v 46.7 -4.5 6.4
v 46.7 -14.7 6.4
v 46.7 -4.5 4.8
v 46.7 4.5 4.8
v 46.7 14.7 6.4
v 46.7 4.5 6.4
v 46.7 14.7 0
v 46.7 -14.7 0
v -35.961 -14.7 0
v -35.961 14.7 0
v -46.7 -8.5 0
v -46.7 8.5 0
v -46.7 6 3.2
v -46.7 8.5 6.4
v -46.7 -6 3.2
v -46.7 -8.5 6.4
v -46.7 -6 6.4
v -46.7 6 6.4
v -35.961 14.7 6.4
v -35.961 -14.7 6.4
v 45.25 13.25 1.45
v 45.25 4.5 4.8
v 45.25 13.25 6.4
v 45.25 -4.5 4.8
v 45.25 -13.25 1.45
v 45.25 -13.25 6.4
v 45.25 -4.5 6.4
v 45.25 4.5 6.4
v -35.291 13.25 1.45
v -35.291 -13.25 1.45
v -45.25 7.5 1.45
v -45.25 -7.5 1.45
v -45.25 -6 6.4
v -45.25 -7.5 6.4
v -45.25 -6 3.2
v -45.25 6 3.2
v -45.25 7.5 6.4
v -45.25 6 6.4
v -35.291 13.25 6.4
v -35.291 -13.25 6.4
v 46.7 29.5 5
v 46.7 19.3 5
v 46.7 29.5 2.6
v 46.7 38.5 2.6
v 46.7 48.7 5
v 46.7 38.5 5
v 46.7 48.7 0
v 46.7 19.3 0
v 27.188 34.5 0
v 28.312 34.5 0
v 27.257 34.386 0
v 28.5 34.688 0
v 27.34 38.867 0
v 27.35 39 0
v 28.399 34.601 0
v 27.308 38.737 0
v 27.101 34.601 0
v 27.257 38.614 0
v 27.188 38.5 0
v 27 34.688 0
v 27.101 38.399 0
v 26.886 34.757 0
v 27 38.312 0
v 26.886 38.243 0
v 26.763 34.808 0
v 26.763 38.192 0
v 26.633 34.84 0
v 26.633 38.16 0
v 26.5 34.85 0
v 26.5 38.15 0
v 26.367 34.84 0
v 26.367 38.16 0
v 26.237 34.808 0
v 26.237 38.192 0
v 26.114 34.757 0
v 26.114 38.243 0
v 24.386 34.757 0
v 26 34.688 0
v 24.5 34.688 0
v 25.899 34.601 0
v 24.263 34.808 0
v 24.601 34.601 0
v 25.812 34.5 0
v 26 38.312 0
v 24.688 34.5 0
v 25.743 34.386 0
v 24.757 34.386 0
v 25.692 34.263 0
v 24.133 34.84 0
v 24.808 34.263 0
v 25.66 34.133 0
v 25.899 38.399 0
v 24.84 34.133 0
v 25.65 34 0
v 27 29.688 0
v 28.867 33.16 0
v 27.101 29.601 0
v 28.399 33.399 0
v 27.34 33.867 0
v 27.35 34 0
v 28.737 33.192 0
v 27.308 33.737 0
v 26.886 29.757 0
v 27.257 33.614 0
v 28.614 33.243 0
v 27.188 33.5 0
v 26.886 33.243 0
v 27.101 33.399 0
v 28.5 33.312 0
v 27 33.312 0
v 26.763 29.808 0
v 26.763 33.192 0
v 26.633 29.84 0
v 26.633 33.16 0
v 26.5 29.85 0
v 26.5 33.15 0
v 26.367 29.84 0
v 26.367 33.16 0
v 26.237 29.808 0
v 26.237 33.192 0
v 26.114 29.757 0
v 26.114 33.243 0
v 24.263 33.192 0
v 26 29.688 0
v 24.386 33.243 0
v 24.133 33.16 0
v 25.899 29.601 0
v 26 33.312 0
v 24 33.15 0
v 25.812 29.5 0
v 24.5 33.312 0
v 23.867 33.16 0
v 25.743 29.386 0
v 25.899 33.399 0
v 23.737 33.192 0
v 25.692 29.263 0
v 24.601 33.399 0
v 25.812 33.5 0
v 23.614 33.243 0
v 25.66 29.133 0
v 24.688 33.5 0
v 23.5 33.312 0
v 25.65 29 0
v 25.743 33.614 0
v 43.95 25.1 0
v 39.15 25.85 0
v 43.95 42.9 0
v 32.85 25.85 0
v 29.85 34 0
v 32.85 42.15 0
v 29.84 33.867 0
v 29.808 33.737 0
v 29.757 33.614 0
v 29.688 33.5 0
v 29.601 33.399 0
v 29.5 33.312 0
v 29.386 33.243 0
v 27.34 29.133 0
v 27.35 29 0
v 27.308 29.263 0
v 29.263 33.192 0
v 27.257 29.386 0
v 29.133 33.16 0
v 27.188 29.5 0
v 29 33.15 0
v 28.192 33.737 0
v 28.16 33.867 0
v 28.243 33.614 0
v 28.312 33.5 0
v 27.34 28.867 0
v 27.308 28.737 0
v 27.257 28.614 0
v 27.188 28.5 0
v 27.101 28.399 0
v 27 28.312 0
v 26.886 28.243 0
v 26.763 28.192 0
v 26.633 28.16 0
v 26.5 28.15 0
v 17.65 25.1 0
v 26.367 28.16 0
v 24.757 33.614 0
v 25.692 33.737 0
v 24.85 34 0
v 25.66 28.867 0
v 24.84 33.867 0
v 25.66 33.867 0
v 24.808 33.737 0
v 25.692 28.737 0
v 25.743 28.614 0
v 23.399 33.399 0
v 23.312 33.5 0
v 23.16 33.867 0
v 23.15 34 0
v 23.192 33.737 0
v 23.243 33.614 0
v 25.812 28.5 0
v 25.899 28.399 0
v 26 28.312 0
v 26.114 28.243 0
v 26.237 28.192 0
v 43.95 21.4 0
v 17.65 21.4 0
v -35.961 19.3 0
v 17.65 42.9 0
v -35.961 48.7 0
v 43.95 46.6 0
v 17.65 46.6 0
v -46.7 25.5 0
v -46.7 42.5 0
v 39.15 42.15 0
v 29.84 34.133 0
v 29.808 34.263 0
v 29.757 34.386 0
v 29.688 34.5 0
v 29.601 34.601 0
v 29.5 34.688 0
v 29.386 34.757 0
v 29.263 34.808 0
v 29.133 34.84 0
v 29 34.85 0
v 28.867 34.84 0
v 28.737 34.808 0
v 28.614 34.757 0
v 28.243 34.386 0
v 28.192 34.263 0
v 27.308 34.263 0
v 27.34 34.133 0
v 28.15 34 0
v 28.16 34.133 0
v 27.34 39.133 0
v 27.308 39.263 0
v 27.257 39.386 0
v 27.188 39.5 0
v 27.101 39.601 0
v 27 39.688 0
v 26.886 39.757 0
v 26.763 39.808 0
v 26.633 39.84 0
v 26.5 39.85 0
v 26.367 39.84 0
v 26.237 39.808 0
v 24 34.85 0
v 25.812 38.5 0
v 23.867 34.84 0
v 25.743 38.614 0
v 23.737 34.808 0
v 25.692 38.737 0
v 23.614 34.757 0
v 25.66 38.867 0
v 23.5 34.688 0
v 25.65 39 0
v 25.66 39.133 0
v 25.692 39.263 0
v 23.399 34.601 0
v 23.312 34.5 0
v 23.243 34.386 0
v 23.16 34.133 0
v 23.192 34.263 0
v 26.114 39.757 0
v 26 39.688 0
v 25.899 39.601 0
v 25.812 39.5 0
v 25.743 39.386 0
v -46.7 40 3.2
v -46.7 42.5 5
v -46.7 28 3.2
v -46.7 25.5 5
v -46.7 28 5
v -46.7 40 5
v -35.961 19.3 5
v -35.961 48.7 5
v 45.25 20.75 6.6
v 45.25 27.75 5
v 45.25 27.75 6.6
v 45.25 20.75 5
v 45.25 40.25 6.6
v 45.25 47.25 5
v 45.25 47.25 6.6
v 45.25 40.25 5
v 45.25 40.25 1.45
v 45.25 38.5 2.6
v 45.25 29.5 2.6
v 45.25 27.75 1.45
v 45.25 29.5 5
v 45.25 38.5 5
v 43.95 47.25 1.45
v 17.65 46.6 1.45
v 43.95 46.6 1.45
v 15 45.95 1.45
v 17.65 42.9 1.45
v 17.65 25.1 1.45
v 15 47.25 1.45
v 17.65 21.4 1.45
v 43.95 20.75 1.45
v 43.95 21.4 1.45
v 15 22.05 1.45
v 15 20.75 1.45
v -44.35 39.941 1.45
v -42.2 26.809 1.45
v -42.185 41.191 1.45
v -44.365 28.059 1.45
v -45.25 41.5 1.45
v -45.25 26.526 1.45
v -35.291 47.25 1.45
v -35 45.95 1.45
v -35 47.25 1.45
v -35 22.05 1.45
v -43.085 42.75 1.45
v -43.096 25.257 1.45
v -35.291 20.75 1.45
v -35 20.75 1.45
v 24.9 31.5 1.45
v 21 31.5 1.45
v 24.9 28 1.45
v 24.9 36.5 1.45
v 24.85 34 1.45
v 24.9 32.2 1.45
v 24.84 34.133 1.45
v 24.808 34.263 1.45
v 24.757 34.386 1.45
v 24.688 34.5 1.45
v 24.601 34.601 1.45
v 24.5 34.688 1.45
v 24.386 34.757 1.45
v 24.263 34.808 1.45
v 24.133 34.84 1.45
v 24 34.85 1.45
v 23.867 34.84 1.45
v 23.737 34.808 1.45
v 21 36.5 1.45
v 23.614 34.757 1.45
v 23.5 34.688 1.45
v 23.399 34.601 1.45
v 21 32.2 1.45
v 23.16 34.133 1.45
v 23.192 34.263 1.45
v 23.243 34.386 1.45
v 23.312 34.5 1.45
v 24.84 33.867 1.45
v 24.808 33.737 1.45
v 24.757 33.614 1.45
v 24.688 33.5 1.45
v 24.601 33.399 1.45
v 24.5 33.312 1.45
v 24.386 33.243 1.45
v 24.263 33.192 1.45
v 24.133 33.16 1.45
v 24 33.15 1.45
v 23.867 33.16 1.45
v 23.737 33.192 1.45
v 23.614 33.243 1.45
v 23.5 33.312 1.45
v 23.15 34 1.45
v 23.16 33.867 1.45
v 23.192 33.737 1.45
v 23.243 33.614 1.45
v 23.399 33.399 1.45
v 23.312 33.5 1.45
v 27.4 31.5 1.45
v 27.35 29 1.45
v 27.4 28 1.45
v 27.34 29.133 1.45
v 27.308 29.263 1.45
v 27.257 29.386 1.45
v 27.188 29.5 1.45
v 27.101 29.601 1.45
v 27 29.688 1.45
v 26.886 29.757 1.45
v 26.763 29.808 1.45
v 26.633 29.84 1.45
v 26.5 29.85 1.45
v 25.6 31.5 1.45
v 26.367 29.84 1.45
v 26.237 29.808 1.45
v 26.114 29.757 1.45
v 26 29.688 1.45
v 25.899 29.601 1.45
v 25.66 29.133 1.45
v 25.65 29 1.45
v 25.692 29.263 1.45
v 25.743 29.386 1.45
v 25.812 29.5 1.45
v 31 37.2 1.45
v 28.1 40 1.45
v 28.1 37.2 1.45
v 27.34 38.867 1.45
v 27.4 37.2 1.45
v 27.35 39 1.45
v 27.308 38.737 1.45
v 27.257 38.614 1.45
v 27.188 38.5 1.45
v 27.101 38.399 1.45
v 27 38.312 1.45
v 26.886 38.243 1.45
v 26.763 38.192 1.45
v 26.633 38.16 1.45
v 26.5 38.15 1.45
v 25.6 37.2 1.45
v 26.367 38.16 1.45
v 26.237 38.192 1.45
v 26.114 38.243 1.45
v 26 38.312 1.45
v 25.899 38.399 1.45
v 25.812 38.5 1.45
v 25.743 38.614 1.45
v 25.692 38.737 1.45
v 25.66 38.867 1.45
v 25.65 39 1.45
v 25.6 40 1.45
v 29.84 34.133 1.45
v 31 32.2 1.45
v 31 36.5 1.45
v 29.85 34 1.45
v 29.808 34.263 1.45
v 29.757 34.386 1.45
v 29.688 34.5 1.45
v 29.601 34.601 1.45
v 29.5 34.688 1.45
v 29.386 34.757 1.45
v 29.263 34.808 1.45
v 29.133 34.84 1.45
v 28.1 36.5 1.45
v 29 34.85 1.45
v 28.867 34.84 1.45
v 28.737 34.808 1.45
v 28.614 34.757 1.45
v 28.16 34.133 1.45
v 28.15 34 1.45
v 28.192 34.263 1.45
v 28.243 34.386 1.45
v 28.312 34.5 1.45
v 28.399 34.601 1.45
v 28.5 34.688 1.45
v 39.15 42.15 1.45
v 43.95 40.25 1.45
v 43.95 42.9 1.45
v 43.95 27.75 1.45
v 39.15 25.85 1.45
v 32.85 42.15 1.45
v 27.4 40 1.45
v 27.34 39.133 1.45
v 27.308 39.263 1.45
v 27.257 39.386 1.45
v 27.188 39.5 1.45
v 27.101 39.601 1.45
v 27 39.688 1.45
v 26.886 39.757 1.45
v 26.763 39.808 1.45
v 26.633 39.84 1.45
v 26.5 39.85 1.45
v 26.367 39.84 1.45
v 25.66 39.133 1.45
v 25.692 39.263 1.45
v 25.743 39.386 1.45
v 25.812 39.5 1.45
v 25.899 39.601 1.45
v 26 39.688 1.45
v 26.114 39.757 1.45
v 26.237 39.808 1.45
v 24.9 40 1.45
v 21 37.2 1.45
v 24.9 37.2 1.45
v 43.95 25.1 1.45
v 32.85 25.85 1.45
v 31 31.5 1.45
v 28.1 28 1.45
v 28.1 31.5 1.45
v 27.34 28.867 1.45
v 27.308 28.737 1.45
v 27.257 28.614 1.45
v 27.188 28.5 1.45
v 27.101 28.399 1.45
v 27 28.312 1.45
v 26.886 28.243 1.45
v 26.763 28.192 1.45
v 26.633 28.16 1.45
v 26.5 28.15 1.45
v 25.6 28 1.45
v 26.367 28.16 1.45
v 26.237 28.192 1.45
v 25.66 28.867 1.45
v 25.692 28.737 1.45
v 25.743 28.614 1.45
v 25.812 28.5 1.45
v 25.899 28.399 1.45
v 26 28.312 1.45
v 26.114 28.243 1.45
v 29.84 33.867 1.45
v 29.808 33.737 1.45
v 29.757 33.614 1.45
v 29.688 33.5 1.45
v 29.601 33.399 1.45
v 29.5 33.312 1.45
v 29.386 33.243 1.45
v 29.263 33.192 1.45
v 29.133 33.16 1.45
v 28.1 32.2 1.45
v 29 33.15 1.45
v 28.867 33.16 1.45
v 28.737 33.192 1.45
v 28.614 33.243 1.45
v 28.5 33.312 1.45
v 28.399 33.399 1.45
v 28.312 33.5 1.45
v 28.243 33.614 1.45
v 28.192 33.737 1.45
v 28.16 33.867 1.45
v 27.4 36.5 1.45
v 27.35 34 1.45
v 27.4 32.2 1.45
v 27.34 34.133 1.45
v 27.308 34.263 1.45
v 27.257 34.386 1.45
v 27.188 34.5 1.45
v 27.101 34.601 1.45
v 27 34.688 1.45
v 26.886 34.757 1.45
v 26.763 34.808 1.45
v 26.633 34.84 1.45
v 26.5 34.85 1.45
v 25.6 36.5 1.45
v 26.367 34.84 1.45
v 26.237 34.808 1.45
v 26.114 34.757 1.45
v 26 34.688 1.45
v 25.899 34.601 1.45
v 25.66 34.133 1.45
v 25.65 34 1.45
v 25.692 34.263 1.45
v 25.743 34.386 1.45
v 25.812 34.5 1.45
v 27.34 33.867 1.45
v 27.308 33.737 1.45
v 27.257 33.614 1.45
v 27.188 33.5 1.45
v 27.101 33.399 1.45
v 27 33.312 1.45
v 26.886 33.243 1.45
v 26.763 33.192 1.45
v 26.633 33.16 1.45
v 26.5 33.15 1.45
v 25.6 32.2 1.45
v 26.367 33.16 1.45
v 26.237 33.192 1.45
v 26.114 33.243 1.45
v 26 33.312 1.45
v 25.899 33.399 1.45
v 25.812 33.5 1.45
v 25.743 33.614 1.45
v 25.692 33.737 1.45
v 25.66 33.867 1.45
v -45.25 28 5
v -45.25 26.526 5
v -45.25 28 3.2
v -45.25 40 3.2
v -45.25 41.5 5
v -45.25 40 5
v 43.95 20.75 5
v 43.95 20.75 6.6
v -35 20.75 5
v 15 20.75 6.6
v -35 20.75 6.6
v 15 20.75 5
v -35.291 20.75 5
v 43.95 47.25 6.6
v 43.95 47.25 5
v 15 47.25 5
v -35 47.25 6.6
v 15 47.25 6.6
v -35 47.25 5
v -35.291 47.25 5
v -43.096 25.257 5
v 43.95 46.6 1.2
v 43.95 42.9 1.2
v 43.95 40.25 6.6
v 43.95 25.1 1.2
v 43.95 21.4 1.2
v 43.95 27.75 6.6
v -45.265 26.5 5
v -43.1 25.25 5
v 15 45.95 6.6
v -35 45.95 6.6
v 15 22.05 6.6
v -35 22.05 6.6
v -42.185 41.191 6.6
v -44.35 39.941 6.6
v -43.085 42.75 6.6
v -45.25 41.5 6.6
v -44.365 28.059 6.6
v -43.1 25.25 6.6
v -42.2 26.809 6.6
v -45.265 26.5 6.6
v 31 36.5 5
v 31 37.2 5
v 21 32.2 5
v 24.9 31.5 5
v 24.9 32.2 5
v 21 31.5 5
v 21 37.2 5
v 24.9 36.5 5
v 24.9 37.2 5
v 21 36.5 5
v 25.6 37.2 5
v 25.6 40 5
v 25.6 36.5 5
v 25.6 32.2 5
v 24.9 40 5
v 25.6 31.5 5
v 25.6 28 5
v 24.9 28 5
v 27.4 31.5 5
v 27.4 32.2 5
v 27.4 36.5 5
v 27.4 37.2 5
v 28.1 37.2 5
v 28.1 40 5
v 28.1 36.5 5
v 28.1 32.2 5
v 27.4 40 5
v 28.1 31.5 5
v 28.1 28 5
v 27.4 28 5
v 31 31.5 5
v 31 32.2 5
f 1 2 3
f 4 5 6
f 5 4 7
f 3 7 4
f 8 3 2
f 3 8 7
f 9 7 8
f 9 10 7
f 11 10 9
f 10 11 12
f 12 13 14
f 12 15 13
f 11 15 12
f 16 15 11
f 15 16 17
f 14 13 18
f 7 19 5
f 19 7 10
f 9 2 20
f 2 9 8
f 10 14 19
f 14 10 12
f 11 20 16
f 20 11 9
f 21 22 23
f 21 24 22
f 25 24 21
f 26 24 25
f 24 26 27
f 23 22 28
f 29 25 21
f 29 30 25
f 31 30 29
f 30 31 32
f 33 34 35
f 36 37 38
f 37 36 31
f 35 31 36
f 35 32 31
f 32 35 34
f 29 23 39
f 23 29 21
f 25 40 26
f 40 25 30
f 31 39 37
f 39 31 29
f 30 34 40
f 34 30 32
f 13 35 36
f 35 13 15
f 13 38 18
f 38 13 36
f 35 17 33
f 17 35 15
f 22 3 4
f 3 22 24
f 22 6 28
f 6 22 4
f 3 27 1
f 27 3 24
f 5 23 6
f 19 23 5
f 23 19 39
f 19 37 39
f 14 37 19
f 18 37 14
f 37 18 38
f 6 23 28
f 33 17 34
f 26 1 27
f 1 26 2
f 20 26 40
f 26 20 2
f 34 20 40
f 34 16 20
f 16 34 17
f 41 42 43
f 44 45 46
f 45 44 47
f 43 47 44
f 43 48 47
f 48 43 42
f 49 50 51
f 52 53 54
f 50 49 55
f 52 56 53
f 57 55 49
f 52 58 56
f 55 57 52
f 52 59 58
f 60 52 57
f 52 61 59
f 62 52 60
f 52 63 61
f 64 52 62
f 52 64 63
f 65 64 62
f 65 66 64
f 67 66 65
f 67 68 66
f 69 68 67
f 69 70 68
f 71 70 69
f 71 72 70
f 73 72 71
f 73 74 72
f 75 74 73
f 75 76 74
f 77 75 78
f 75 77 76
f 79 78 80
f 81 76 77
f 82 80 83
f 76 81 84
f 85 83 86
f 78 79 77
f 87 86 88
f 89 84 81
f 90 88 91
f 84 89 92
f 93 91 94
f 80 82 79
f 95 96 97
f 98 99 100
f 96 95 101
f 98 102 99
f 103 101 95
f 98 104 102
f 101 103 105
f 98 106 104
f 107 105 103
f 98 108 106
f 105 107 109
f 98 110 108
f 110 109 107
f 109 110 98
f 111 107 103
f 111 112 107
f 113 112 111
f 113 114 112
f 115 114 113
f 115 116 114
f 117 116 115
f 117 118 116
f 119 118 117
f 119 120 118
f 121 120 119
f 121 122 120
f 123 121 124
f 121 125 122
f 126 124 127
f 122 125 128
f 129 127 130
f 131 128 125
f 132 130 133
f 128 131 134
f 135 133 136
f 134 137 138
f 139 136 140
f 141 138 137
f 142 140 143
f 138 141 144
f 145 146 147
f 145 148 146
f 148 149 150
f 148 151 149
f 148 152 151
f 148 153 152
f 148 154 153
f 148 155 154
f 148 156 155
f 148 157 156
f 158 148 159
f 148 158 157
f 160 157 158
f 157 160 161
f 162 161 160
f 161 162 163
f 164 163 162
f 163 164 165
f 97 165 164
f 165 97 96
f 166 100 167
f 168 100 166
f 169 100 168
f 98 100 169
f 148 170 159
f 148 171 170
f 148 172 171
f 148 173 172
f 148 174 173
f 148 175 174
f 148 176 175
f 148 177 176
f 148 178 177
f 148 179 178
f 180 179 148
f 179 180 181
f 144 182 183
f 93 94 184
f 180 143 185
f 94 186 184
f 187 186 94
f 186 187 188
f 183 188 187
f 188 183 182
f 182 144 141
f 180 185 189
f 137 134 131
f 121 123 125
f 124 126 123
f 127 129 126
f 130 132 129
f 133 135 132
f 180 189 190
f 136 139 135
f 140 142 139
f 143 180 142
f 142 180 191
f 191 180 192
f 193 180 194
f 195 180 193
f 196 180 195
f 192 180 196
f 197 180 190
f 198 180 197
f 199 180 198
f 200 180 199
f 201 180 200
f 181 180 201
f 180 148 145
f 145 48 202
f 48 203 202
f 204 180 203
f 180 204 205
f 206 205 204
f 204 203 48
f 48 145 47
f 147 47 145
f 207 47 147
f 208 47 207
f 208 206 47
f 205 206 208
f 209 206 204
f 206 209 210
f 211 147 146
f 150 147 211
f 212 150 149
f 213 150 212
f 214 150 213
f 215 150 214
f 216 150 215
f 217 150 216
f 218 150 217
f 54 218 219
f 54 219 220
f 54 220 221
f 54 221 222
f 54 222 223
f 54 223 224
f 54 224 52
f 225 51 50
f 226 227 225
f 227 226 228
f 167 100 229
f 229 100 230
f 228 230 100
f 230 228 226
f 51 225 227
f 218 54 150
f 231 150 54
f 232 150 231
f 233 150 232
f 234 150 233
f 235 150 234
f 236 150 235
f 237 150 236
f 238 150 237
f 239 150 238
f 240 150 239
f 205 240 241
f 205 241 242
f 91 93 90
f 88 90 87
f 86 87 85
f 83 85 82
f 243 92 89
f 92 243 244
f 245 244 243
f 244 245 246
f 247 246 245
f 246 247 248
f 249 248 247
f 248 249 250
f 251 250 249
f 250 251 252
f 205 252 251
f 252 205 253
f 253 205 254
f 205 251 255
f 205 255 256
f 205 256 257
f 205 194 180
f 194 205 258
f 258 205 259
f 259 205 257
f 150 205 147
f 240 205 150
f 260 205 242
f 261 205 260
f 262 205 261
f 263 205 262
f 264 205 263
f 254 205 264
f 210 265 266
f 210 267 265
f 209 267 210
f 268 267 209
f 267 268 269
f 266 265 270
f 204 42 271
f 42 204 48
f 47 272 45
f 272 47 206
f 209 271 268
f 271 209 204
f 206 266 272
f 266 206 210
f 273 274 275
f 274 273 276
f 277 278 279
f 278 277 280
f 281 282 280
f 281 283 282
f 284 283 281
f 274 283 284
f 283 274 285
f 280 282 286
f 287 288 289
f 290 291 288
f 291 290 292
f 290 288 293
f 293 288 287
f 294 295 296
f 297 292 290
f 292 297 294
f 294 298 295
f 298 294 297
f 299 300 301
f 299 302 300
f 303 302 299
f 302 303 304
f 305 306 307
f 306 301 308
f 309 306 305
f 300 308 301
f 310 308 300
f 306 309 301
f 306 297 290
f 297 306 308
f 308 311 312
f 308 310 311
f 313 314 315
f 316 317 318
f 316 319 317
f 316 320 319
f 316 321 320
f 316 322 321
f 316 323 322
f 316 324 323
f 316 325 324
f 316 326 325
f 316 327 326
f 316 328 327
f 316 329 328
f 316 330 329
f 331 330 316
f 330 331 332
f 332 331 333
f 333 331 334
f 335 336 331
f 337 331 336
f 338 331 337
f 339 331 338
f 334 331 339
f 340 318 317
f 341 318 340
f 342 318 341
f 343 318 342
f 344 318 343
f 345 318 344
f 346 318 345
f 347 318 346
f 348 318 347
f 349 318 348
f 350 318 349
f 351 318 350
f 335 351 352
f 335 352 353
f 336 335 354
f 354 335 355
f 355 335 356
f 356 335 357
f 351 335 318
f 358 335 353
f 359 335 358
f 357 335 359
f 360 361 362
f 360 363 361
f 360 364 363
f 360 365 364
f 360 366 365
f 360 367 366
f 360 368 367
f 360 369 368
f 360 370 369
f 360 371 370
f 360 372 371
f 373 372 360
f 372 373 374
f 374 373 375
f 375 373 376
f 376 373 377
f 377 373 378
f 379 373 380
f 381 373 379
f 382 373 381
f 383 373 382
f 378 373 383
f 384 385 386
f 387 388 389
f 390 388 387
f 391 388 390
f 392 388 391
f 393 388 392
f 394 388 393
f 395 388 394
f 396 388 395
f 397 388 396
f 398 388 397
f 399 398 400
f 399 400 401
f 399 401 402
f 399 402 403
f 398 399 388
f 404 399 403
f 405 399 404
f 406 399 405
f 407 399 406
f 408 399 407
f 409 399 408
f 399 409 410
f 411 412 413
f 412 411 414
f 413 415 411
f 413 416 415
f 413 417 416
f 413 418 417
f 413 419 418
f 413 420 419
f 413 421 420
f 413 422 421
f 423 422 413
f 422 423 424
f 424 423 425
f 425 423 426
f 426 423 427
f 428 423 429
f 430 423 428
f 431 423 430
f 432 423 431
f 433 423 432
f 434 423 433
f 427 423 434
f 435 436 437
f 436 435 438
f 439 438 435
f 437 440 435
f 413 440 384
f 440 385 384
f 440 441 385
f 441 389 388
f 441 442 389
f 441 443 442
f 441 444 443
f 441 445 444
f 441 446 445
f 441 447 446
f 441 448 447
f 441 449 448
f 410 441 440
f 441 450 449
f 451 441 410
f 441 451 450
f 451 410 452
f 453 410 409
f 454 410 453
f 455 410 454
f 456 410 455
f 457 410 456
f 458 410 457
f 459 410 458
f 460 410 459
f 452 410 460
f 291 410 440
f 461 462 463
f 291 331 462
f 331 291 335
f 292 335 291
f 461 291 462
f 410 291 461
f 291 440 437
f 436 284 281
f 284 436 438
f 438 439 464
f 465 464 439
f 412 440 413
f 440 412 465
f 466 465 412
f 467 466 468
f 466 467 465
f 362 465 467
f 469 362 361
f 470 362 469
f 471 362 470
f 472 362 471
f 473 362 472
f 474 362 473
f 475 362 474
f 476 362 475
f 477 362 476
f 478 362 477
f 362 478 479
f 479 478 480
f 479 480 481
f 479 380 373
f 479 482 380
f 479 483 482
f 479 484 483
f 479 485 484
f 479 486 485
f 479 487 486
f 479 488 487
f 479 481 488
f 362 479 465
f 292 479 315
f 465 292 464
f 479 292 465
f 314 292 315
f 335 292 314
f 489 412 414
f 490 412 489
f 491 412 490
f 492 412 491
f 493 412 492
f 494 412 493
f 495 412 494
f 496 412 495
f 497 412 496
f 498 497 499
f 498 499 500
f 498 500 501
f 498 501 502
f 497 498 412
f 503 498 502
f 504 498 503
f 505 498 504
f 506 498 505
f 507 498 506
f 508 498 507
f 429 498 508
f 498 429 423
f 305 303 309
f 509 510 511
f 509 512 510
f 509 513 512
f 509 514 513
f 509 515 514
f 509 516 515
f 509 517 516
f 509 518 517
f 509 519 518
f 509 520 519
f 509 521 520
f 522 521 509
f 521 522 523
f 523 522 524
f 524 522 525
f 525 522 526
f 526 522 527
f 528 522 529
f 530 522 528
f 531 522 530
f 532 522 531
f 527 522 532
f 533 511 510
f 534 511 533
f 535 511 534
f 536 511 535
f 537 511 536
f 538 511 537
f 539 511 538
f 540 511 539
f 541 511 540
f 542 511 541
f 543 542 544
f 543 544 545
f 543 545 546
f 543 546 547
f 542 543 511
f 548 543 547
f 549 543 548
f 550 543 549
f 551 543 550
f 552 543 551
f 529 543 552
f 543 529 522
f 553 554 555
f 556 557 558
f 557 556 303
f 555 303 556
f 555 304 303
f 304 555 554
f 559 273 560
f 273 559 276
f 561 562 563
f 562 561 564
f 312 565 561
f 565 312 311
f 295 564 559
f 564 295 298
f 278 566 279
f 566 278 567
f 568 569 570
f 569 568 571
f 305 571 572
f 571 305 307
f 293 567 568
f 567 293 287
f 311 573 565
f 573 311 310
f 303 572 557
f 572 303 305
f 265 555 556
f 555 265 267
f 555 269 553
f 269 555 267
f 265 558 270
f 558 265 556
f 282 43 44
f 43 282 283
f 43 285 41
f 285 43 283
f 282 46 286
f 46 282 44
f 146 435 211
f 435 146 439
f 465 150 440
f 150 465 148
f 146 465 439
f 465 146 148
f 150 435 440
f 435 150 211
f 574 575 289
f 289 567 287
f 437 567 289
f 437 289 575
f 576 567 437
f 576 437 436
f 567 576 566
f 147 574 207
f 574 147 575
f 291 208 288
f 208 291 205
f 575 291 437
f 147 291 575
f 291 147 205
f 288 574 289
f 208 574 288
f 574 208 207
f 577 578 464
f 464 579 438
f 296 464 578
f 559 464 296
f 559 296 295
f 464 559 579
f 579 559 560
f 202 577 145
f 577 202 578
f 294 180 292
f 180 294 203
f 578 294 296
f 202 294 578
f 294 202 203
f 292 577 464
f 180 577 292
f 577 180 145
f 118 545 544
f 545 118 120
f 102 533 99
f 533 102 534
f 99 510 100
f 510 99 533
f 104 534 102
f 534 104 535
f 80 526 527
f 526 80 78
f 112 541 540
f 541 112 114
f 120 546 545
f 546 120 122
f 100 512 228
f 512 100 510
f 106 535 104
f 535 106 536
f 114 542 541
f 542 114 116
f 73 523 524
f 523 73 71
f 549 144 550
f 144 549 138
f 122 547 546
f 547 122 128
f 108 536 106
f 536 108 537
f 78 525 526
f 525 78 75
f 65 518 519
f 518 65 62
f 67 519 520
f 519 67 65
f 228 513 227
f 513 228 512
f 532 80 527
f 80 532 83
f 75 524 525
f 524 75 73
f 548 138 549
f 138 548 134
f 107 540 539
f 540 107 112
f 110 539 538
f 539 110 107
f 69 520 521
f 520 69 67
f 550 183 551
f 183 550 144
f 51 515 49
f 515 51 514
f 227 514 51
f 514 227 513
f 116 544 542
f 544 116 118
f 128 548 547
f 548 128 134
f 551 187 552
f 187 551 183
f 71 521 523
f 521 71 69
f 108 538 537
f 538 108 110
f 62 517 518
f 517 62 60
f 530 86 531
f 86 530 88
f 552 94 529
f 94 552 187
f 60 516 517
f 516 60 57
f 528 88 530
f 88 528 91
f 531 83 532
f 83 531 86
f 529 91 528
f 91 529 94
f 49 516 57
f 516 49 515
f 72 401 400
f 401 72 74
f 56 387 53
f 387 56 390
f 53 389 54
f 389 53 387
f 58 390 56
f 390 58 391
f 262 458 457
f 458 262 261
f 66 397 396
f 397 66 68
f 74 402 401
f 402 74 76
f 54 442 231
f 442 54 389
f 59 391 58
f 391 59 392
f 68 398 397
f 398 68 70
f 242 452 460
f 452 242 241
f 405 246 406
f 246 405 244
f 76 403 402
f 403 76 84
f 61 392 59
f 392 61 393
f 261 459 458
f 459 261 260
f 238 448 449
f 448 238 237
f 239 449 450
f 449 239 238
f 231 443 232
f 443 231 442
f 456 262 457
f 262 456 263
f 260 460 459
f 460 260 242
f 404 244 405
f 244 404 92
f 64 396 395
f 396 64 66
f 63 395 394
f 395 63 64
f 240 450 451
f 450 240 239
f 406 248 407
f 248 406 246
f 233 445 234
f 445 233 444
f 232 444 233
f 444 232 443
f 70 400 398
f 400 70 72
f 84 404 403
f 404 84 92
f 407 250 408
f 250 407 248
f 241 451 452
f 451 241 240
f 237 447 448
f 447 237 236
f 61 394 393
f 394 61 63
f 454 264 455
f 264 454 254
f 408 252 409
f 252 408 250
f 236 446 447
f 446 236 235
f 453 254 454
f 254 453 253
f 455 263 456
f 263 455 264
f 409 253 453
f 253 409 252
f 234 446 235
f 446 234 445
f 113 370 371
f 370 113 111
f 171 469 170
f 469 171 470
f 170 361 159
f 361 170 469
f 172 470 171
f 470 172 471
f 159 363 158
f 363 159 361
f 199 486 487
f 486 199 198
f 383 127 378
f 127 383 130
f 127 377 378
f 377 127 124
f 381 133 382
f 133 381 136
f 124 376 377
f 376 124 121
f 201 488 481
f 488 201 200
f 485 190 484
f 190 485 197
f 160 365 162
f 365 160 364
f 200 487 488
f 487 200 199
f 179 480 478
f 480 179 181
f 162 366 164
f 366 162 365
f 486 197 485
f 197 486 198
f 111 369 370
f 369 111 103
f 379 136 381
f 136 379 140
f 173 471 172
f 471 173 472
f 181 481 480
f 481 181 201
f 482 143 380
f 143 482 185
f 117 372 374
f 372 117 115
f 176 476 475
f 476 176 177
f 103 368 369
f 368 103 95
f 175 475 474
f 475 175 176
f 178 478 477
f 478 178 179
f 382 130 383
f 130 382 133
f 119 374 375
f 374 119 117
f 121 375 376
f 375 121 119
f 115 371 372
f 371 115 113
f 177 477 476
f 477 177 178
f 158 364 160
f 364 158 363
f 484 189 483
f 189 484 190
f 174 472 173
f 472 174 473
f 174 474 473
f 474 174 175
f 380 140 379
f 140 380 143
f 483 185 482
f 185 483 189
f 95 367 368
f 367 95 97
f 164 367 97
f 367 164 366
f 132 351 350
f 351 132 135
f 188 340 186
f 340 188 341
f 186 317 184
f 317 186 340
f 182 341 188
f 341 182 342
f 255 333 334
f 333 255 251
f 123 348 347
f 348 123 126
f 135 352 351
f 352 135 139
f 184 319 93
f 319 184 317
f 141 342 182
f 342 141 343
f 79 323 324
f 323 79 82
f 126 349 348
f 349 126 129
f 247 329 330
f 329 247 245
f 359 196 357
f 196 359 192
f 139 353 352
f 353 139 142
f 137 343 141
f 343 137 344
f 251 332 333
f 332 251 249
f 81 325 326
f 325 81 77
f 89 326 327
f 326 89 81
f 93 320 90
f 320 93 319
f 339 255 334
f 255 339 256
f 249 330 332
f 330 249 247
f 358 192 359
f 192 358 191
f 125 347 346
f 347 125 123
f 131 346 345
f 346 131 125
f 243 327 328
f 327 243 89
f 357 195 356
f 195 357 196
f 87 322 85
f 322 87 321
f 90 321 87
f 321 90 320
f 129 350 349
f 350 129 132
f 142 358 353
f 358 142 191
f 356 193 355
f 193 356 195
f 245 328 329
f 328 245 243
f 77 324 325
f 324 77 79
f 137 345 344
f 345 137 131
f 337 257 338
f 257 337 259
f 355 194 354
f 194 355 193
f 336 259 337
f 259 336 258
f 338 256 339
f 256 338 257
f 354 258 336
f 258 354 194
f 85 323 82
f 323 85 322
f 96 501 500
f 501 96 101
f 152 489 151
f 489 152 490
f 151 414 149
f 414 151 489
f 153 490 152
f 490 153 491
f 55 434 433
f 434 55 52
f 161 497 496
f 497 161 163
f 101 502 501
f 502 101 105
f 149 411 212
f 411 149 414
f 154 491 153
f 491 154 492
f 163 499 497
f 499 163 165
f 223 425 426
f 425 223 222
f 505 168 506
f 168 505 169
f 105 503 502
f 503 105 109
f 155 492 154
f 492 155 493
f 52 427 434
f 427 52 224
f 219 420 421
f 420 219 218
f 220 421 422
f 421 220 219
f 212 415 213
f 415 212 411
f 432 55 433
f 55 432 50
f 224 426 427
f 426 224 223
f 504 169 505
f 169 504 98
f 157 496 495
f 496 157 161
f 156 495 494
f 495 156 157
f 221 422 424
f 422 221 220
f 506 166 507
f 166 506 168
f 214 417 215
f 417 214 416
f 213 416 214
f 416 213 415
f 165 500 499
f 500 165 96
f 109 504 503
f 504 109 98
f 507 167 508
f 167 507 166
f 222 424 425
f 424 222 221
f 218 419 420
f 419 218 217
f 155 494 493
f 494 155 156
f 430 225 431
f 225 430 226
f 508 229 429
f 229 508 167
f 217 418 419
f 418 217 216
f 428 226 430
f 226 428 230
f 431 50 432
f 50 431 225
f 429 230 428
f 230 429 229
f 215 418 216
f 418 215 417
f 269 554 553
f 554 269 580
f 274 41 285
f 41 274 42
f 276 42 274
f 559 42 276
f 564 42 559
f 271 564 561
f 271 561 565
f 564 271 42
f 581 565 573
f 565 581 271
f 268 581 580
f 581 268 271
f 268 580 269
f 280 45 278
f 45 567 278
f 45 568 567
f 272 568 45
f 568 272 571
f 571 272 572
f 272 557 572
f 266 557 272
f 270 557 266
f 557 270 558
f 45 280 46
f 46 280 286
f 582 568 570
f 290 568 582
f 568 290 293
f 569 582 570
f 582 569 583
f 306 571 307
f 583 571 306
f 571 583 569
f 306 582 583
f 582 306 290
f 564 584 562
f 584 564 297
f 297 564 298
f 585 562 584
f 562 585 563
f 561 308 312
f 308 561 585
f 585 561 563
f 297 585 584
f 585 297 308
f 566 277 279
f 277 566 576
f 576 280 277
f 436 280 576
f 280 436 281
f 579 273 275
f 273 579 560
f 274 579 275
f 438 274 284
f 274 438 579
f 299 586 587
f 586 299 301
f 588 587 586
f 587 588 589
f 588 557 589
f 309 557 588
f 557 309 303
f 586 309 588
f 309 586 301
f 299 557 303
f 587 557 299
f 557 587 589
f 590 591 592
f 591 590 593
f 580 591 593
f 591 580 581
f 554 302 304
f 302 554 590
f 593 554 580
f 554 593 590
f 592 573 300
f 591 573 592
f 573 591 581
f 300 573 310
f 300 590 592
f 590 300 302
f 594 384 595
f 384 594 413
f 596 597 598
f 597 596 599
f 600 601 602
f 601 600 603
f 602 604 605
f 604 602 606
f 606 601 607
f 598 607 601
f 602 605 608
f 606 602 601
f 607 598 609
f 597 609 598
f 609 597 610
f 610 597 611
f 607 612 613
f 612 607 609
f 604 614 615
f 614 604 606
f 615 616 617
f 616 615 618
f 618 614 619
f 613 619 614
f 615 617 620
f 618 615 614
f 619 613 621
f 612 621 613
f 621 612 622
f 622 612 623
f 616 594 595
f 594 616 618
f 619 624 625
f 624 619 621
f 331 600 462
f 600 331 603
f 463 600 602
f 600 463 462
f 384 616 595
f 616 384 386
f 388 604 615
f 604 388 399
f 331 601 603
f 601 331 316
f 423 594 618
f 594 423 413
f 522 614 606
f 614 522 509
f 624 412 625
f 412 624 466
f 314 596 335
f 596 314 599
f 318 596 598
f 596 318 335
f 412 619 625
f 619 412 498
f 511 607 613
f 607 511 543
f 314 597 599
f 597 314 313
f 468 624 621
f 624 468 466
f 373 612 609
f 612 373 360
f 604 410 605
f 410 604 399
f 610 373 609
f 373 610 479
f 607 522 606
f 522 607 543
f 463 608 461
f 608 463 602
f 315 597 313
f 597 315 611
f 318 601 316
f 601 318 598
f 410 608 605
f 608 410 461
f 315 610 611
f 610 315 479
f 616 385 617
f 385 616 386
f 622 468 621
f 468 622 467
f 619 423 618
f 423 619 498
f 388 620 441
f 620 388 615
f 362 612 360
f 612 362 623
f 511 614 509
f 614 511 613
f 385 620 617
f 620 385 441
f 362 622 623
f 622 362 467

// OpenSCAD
$Wall = 1.2;
$Clearance = 0.5;
$Length = 90;
$Width = 26;
$Height = 8;
$PrintSplit = 5;
$AlignWidth = 1.3;
$AlignHeight = 1.6;

module MainShell()
{
  //Main base of shell
  difference()
  {
    cube([$Length + $Wall + $Clearance + $Wall + $Clearance, $Width + $Wall + $Clearance + $Wall + $Clearance, $Height + $Wall + $Clearance + $Wall + $Clearance], center = true);
    translate([-($Length + $Wall + $Clearance + $Wall + $Clearance) / 2, ($Width / 2) - 4.5, 0])
      rotate(30, [0, 0, 1])
        translate([0, 0, -($Height + $Wall + $Clearance + $Wall + $Clearance + 1) / 2])
          cube([20, 10, $Height + $Wall + $Clearance + $Wall + $Clearance + 1]);
    translate([-($Length + $Wall + $Clearance + $Wall + $Clearance) / 2,  -($Width / 2) + 4.5, 0])
      rotate(-30, [0, 0, 1])
        translate([0, -10, -($Height + $Wall + $Clearance + $Wall + $Clearance + 1) / 2])
          cube([20, 10, $Height + $Wall + $Clearance + $Wall + $Clearance + 1]);
  }
}

module InnerOpening()
{
  //Main base of shell
  difference()
  {
    cube([$Length + $Clearance, $Width + $Clearance, $Height + $Clearance], center = true);
    translate([-($Length + $Clearance) / 2,($Width / 2) - 5.5, 0])
      rotate(30, [0, 0, 1])
        translate([0, 0, -5])
          cube([20, 10, 10]);
    translate([-($Length + $Clearance) / 2,  -($Width / 2) + 5.5, 0])
      rotate(-30, [0, 0, 1])
        translate([0, -10, -5])
          cube([20, 10, 10]);
  }
}

module Dongle()
{
  difference()
  {
    MainShell();
    //
    InnerOpening();
    //USB opening
    translate([-$Length / 2, 0, 0])
      cube([4, 12, 5], center = true);
    //IRDA opening
    translate([$Length / 2, 0, 1.1])
      cube([4, 9, 4], center = true);
    // Port [7:0] opening
    translate([($Length / 2) - 9, 0, $Wall + $Clearance + 2])
      cube([6.3, 16.3, $Height], center = true);
    // Port [15:8] opening
    translate([($Length / 2) - 14.2, -10.75, $Wall + $Clearance + 2])
      cube([26.3, 3.7, 5], center = true);
    //Test opening
    translate([($Length / 2) - 14.2, 10.75, $Wall + $Clearance + 2])
      cube([26.3, 3.7, 5], center = true);
    //LED openings
    //Center
    translate([($Length / 2) - 18.5, 0, 2])
      cylinder(d = 1.7, h = 5, $fn = 40);
    //Bottom
    translate([($Length / 2) - 18.5, -5, 2])
      cylinder(d = 1.7, h = 5, $fn = 40);
    //Top
    translate([($Length / 2) - 18.5, 5, 2])
      cylinder(d = 1.7, h = 5, $fn = 40);
    //Left
    translate([($Length / 2) - 18.5 - 2.5, 0, 2])
      cylinder(d = 1.7, h = 5, $fn = 40);
    //Right
    translate([($Length / 2) - 18.5 + 2.5, 0, 2])
      cylinder(d = 1.7, h = 5, $fn = 40);
  }
}

module PrintBottom()
{
    difference()
    {
      translate([0, 0, ($Height + $Wall + $Clearance + $Wall + $Clearance) / 2])
        Dongle();
      //Slice top off 
      translate([-($Length + $Wall + $Wall + $Clearance + $Clearance + 2)  / 2, -($Width + $Wall + $Wall + $Clearance + $Clearance + 2) / 2, $Height + $Wall + $Wall + $Clearance + $Clearance - $PrintSplit])
        cube([$Length + $Wall + $Wall + $Clearance + $Clearance + 2, $Width + $Wall + $Wall + $Clearance + $Clearance + 2, 20]);
    }
}  

module PrintTop()
{
  difference()
  {
    translate([0, 0, ($Height + $Wall + $Clearance + $Wall + $Clearance) / 2])
      rotate(180, [1, 0, 0])
        Dongle();
    translate([-($Length + $Wall + $Wall + $Clearance + $Clearance + 2)  / 2, -($Width + $Wall + $Wall + $Clearance + $Clearance + 2) / 2, $PrintSplit + 20])
      translate([0, 0, -20])
        cube([$Length + $Wall + $Wall + $Clearance + $Clearance + 2, $Width + $Wall + $Wall + $Clearance + $Clearance + 2, 20]);
    }
    
    //Now add alignment rails
    translate([-35, (($Width + $Clearance) / 2) - $AlignWidth, $Wall])
      cube([$Length - 40, $AlignWidth, ($PrintSplit - $Wall + $AlignHeight)]);
    translate([-35, (-($Width + $Clearance) / 2) , $Wall])
      cube([$Length - 40, $AlignWidth, ($PrintSplit - $Wall + $AlignHeight)]);

    translate([(($Length + $Clearance) / 2) - $AlignWidth, (($Width + $Clearance) / 2) - 7, $Wall])
      cube([$AlignWidth, 7, ($PrintSplit - $Wall + $AlignHeight)]);
    translate([(($Length + $Clearance) / 2) - $AlignWidth, (-($Width + $Clearance) / 2) , $Wall])
      cube([$AlignWidth, 7, ($PrintSplit - $Wall + $AlignHeight)]);

    translate([(-($Length + $Clearance) / 2), (($Width + $Clearance) / 2) - 5.75, $Wall])
      rotate(-60, [0, 0, 1])
        cube([$AlignWidth + .5, 2.5, ($PrintSplit - $Wall + $AlignHeight)]);
    translate([(-($Length + $Clearance) / 2) + 2.15, -(($Width + $Clearance) / 2) + 7 - 2.5, $Wall])
      rotate(60, [0, 0, 1])
        cube([$AlignWidth + .5, 2.5, ($PrintSplit - $Wall + $AlignHeight)]);


    //LED light shields
    translate([21, 2.5, 1.0])
      cube([10, .7, 4]);
    translate([21, -2.5, 1.0])
      cube([10, .7, 4]);
    translate([24.9, -6, 1.0])
      cube([.7, 12, 4]);
    translate([27.4, -6, 1.0])
      cube([.7, 12, 4]);
}  


PrintBottom();
translate([0, $Width + 8, 0])
  PrintTop();

//Dongle();
